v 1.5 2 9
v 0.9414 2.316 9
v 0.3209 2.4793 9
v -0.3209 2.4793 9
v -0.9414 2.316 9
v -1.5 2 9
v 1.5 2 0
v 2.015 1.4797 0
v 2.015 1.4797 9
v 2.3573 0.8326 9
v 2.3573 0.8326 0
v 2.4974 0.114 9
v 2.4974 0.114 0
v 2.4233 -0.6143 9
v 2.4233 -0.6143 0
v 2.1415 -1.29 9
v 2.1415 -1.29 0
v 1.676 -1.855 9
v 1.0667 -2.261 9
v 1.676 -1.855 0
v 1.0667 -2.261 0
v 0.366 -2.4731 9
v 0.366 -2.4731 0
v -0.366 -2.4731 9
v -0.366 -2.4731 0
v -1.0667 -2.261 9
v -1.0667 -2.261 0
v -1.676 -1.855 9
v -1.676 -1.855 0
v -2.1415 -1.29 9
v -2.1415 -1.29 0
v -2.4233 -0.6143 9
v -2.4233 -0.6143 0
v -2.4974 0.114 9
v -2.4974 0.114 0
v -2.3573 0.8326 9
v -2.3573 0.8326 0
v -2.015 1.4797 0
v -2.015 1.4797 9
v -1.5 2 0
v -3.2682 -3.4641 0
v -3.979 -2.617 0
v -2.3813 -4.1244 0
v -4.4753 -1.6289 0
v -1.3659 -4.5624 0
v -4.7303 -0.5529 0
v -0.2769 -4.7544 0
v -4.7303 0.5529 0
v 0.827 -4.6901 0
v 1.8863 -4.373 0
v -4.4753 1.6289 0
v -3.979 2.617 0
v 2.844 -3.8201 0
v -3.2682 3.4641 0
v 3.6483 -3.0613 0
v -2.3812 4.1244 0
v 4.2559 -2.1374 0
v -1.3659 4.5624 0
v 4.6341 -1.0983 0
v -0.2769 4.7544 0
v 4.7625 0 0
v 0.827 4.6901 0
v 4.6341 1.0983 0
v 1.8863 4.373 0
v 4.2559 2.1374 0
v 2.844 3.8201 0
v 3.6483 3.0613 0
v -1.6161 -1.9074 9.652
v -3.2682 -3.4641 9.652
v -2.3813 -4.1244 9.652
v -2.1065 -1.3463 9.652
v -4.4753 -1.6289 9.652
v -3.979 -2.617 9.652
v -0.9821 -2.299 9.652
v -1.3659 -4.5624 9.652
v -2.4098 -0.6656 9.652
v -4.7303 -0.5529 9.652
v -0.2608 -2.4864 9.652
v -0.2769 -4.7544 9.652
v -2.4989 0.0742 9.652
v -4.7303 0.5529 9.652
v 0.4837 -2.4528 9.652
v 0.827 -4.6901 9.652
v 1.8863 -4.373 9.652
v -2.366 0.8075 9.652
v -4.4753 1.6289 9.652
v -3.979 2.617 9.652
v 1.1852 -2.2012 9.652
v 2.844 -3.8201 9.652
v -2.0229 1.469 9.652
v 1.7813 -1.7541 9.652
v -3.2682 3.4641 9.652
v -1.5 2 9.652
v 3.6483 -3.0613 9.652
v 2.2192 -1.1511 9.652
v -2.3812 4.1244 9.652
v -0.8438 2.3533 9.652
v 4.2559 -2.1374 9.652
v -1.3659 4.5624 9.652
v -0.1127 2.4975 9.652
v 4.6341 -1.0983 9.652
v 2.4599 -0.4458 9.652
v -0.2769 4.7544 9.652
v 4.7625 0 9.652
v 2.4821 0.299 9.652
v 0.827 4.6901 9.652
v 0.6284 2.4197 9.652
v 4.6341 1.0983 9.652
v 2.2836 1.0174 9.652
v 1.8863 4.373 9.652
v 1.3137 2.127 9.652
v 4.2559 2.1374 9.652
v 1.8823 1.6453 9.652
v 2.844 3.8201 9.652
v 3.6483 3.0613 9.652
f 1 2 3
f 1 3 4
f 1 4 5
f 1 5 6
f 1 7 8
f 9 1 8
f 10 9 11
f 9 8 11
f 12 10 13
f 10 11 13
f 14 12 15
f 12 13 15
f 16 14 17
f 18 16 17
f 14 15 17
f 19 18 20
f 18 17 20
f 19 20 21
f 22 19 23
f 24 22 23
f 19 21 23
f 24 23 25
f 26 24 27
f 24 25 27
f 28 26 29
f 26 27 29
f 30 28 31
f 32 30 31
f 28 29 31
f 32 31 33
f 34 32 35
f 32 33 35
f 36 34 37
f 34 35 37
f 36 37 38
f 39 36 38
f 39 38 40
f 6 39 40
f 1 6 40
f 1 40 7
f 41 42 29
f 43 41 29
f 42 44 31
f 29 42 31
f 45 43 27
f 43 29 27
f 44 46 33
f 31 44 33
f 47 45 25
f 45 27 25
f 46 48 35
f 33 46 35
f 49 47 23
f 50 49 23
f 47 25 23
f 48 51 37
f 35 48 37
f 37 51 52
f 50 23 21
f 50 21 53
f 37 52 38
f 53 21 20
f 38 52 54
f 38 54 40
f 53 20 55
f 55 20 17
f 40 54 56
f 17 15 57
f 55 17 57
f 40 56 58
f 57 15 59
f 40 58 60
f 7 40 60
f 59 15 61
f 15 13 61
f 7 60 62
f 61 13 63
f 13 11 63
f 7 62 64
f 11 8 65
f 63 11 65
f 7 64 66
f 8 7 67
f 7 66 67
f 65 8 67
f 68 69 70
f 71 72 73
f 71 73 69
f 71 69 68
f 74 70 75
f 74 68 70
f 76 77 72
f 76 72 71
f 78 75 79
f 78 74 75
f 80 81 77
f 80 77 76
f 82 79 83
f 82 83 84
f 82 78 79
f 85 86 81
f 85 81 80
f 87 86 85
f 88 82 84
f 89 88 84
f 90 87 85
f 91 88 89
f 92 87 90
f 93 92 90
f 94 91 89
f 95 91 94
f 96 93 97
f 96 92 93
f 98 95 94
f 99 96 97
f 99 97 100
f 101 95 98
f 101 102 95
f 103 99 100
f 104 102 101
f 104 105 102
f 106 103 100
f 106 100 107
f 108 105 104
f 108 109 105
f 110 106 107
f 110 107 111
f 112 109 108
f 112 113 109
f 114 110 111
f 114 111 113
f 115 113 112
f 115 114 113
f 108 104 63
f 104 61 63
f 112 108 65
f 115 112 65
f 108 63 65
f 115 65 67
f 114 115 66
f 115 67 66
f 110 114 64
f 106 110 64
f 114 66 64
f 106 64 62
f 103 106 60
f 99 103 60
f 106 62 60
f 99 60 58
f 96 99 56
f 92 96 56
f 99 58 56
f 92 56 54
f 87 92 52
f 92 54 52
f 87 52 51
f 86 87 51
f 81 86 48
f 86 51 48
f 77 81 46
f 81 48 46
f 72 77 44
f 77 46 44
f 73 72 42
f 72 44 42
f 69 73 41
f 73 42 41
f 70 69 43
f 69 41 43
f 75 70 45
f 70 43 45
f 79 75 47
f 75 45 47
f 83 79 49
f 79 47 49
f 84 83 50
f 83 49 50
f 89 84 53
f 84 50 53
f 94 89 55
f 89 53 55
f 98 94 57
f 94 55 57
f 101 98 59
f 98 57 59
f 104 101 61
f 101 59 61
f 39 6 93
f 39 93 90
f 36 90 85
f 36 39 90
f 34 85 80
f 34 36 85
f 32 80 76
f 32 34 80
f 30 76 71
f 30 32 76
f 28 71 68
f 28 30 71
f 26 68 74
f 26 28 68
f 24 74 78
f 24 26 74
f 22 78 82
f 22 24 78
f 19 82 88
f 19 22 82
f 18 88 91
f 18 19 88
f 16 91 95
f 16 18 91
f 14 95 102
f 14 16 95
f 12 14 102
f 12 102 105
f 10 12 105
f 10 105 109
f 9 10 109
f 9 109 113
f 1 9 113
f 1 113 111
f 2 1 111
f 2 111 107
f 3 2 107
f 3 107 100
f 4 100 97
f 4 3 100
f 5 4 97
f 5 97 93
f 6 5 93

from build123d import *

# Parameters (mm, degrees)
SKETCH1_R           = 4.7625
BOSS_EXTRUDE1_DEPTH = 9
SKETCH2_R           = 4.7625
SKETCH2_R_2         = 2.5
BOSS_EXTRUDE2_DEPTH = 0.652


with BuildPart() as part:
    # Sketch1 → Boss-Extrude1 (new body)
    with BuildSketch(Plane.XY):
        Circle(SKETCH1_R)
        with BuildLine():
            Line((-1.5, 2), (1.5, 2))
            ThreePointArc((1.5, 2), (0, -2.5), (-1.5, 2))
        make_face(mode=Mode.SUBTRACT)
    extrude(amount=BOSS_EXTRUDE1_DEPTH)

    # Sketch2 → Boss-Extrude2 (add)
    with BuildSketch(Plane.XY.offset(9)):
        Circle(SKETCH2_R)
        with Locations(Location((0, 0, 0), (0, 0, 126.869897646))):
            Circle(SKETCH2_R_2, mode=Mode.SUBTRACT)
    extrude(amount=BOSS_EXTRUDE2_DEPTH)


solid = part.part
